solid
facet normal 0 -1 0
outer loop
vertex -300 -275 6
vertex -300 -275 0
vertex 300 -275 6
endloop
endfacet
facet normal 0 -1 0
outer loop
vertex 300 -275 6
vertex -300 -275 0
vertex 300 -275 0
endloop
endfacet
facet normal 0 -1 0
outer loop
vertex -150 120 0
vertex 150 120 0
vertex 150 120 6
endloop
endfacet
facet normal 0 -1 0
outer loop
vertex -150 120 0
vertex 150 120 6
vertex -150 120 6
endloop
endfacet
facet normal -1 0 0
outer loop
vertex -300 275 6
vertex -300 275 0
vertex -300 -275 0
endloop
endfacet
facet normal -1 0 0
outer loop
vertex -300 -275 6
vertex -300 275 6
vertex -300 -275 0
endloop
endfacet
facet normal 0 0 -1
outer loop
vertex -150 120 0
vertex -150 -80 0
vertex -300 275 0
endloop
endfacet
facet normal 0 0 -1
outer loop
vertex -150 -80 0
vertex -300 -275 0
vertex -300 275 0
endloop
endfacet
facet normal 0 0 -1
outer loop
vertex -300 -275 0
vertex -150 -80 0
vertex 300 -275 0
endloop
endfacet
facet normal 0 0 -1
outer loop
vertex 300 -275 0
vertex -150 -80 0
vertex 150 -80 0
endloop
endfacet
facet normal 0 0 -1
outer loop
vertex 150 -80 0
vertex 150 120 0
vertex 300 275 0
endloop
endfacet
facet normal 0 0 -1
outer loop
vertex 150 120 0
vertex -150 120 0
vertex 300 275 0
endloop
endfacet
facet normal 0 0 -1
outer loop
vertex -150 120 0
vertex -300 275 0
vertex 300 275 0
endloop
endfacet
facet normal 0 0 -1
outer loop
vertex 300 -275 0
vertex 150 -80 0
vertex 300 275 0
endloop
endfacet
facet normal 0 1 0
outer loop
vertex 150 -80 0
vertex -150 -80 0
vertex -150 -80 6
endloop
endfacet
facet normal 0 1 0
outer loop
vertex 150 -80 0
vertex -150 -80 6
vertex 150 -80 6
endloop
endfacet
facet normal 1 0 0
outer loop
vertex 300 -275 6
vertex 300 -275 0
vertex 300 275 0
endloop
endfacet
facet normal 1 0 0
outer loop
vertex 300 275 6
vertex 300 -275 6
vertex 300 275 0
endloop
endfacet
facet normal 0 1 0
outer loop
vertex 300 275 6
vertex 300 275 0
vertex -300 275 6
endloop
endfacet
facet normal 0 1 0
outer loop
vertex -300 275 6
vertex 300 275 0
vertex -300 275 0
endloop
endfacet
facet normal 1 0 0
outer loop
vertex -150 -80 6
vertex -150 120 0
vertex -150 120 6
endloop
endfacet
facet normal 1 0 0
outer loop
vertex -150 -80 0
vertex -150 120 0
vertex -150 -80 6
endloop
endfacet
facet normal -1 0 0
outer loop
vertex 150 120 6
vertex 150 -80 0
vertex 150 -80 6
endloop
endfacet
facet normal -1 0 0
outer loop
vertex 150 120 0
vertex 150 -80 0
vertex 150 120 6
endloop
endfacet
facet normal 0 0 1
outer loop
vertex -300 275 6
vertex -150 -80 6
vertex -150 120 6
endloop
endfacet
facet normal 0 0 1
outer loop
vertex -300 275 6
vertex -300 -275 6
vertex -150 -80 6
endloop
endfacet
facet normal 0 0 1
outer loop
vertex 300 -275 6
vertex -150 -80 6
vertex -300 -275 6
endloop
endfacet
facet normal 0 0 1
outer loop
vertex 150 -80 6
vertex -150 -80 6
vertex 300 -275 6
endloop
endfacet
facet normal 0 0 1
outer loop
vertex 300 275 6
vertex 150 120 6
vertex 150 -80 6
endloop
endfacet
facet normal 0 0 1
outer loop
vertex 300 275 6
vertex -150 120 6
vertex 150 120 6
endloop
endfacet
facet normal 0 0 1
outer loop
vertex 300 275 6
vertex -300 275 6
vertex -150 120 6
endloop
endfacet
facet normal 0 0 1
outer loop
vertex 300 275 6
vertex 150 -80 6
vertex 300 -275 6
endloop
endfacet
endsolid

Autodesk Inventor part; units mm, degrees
ref_plane "YZ Plane" through (0, 0, 0) normal (1, 0, 0) x (0, 1, 0)
ref_plane "XZ Plane" through (0, 0, 0) normal (0, 1, 0) x (-1, 0, 0)
ref_plane "XY Plane" through (0, 0, 0) normal (0, 0, 1) x (1, 0, 0)
sketch "Sketch1" plane through (0, 0, 0) normal (0, 0, 1) x (1, 0, 0)
  line L0 (-300, -275) -> (300, -275)
  line L1 (300, -275) -> (300, 275)
  line L2 (300, 275) -> (-300, 275)
  line L3 (-300, 275) -> (-300, -275)
  line L4 (-300, -275) -> (300, 275) construction
  line L5 (300, -275) -> (-300, 275) construction
  line L6 (-150, -80) -> (150, -80)
  line L7 (150, -80) -> (150, 120)
  line L8 (150, 120) -> (-150, 120)
  line L9 (-150, 120) -> (-150, -80)
  line L10 (-150, -80) -> (150, 120) construction
  line L11 (150, -80) -> (-150, 120) construction
  line L12 (0, 20) -> (0, 0) construction
  dimension "d0" = 600
  dimension "d1" = 550
  dimension "d4" = 300
  dimension "d5" = 200
  dimension "d6" = 20
extrude "Extrusion1" add sketch "Sketch1" along normal blind 6
properties part number "drzwiczki-przod"
